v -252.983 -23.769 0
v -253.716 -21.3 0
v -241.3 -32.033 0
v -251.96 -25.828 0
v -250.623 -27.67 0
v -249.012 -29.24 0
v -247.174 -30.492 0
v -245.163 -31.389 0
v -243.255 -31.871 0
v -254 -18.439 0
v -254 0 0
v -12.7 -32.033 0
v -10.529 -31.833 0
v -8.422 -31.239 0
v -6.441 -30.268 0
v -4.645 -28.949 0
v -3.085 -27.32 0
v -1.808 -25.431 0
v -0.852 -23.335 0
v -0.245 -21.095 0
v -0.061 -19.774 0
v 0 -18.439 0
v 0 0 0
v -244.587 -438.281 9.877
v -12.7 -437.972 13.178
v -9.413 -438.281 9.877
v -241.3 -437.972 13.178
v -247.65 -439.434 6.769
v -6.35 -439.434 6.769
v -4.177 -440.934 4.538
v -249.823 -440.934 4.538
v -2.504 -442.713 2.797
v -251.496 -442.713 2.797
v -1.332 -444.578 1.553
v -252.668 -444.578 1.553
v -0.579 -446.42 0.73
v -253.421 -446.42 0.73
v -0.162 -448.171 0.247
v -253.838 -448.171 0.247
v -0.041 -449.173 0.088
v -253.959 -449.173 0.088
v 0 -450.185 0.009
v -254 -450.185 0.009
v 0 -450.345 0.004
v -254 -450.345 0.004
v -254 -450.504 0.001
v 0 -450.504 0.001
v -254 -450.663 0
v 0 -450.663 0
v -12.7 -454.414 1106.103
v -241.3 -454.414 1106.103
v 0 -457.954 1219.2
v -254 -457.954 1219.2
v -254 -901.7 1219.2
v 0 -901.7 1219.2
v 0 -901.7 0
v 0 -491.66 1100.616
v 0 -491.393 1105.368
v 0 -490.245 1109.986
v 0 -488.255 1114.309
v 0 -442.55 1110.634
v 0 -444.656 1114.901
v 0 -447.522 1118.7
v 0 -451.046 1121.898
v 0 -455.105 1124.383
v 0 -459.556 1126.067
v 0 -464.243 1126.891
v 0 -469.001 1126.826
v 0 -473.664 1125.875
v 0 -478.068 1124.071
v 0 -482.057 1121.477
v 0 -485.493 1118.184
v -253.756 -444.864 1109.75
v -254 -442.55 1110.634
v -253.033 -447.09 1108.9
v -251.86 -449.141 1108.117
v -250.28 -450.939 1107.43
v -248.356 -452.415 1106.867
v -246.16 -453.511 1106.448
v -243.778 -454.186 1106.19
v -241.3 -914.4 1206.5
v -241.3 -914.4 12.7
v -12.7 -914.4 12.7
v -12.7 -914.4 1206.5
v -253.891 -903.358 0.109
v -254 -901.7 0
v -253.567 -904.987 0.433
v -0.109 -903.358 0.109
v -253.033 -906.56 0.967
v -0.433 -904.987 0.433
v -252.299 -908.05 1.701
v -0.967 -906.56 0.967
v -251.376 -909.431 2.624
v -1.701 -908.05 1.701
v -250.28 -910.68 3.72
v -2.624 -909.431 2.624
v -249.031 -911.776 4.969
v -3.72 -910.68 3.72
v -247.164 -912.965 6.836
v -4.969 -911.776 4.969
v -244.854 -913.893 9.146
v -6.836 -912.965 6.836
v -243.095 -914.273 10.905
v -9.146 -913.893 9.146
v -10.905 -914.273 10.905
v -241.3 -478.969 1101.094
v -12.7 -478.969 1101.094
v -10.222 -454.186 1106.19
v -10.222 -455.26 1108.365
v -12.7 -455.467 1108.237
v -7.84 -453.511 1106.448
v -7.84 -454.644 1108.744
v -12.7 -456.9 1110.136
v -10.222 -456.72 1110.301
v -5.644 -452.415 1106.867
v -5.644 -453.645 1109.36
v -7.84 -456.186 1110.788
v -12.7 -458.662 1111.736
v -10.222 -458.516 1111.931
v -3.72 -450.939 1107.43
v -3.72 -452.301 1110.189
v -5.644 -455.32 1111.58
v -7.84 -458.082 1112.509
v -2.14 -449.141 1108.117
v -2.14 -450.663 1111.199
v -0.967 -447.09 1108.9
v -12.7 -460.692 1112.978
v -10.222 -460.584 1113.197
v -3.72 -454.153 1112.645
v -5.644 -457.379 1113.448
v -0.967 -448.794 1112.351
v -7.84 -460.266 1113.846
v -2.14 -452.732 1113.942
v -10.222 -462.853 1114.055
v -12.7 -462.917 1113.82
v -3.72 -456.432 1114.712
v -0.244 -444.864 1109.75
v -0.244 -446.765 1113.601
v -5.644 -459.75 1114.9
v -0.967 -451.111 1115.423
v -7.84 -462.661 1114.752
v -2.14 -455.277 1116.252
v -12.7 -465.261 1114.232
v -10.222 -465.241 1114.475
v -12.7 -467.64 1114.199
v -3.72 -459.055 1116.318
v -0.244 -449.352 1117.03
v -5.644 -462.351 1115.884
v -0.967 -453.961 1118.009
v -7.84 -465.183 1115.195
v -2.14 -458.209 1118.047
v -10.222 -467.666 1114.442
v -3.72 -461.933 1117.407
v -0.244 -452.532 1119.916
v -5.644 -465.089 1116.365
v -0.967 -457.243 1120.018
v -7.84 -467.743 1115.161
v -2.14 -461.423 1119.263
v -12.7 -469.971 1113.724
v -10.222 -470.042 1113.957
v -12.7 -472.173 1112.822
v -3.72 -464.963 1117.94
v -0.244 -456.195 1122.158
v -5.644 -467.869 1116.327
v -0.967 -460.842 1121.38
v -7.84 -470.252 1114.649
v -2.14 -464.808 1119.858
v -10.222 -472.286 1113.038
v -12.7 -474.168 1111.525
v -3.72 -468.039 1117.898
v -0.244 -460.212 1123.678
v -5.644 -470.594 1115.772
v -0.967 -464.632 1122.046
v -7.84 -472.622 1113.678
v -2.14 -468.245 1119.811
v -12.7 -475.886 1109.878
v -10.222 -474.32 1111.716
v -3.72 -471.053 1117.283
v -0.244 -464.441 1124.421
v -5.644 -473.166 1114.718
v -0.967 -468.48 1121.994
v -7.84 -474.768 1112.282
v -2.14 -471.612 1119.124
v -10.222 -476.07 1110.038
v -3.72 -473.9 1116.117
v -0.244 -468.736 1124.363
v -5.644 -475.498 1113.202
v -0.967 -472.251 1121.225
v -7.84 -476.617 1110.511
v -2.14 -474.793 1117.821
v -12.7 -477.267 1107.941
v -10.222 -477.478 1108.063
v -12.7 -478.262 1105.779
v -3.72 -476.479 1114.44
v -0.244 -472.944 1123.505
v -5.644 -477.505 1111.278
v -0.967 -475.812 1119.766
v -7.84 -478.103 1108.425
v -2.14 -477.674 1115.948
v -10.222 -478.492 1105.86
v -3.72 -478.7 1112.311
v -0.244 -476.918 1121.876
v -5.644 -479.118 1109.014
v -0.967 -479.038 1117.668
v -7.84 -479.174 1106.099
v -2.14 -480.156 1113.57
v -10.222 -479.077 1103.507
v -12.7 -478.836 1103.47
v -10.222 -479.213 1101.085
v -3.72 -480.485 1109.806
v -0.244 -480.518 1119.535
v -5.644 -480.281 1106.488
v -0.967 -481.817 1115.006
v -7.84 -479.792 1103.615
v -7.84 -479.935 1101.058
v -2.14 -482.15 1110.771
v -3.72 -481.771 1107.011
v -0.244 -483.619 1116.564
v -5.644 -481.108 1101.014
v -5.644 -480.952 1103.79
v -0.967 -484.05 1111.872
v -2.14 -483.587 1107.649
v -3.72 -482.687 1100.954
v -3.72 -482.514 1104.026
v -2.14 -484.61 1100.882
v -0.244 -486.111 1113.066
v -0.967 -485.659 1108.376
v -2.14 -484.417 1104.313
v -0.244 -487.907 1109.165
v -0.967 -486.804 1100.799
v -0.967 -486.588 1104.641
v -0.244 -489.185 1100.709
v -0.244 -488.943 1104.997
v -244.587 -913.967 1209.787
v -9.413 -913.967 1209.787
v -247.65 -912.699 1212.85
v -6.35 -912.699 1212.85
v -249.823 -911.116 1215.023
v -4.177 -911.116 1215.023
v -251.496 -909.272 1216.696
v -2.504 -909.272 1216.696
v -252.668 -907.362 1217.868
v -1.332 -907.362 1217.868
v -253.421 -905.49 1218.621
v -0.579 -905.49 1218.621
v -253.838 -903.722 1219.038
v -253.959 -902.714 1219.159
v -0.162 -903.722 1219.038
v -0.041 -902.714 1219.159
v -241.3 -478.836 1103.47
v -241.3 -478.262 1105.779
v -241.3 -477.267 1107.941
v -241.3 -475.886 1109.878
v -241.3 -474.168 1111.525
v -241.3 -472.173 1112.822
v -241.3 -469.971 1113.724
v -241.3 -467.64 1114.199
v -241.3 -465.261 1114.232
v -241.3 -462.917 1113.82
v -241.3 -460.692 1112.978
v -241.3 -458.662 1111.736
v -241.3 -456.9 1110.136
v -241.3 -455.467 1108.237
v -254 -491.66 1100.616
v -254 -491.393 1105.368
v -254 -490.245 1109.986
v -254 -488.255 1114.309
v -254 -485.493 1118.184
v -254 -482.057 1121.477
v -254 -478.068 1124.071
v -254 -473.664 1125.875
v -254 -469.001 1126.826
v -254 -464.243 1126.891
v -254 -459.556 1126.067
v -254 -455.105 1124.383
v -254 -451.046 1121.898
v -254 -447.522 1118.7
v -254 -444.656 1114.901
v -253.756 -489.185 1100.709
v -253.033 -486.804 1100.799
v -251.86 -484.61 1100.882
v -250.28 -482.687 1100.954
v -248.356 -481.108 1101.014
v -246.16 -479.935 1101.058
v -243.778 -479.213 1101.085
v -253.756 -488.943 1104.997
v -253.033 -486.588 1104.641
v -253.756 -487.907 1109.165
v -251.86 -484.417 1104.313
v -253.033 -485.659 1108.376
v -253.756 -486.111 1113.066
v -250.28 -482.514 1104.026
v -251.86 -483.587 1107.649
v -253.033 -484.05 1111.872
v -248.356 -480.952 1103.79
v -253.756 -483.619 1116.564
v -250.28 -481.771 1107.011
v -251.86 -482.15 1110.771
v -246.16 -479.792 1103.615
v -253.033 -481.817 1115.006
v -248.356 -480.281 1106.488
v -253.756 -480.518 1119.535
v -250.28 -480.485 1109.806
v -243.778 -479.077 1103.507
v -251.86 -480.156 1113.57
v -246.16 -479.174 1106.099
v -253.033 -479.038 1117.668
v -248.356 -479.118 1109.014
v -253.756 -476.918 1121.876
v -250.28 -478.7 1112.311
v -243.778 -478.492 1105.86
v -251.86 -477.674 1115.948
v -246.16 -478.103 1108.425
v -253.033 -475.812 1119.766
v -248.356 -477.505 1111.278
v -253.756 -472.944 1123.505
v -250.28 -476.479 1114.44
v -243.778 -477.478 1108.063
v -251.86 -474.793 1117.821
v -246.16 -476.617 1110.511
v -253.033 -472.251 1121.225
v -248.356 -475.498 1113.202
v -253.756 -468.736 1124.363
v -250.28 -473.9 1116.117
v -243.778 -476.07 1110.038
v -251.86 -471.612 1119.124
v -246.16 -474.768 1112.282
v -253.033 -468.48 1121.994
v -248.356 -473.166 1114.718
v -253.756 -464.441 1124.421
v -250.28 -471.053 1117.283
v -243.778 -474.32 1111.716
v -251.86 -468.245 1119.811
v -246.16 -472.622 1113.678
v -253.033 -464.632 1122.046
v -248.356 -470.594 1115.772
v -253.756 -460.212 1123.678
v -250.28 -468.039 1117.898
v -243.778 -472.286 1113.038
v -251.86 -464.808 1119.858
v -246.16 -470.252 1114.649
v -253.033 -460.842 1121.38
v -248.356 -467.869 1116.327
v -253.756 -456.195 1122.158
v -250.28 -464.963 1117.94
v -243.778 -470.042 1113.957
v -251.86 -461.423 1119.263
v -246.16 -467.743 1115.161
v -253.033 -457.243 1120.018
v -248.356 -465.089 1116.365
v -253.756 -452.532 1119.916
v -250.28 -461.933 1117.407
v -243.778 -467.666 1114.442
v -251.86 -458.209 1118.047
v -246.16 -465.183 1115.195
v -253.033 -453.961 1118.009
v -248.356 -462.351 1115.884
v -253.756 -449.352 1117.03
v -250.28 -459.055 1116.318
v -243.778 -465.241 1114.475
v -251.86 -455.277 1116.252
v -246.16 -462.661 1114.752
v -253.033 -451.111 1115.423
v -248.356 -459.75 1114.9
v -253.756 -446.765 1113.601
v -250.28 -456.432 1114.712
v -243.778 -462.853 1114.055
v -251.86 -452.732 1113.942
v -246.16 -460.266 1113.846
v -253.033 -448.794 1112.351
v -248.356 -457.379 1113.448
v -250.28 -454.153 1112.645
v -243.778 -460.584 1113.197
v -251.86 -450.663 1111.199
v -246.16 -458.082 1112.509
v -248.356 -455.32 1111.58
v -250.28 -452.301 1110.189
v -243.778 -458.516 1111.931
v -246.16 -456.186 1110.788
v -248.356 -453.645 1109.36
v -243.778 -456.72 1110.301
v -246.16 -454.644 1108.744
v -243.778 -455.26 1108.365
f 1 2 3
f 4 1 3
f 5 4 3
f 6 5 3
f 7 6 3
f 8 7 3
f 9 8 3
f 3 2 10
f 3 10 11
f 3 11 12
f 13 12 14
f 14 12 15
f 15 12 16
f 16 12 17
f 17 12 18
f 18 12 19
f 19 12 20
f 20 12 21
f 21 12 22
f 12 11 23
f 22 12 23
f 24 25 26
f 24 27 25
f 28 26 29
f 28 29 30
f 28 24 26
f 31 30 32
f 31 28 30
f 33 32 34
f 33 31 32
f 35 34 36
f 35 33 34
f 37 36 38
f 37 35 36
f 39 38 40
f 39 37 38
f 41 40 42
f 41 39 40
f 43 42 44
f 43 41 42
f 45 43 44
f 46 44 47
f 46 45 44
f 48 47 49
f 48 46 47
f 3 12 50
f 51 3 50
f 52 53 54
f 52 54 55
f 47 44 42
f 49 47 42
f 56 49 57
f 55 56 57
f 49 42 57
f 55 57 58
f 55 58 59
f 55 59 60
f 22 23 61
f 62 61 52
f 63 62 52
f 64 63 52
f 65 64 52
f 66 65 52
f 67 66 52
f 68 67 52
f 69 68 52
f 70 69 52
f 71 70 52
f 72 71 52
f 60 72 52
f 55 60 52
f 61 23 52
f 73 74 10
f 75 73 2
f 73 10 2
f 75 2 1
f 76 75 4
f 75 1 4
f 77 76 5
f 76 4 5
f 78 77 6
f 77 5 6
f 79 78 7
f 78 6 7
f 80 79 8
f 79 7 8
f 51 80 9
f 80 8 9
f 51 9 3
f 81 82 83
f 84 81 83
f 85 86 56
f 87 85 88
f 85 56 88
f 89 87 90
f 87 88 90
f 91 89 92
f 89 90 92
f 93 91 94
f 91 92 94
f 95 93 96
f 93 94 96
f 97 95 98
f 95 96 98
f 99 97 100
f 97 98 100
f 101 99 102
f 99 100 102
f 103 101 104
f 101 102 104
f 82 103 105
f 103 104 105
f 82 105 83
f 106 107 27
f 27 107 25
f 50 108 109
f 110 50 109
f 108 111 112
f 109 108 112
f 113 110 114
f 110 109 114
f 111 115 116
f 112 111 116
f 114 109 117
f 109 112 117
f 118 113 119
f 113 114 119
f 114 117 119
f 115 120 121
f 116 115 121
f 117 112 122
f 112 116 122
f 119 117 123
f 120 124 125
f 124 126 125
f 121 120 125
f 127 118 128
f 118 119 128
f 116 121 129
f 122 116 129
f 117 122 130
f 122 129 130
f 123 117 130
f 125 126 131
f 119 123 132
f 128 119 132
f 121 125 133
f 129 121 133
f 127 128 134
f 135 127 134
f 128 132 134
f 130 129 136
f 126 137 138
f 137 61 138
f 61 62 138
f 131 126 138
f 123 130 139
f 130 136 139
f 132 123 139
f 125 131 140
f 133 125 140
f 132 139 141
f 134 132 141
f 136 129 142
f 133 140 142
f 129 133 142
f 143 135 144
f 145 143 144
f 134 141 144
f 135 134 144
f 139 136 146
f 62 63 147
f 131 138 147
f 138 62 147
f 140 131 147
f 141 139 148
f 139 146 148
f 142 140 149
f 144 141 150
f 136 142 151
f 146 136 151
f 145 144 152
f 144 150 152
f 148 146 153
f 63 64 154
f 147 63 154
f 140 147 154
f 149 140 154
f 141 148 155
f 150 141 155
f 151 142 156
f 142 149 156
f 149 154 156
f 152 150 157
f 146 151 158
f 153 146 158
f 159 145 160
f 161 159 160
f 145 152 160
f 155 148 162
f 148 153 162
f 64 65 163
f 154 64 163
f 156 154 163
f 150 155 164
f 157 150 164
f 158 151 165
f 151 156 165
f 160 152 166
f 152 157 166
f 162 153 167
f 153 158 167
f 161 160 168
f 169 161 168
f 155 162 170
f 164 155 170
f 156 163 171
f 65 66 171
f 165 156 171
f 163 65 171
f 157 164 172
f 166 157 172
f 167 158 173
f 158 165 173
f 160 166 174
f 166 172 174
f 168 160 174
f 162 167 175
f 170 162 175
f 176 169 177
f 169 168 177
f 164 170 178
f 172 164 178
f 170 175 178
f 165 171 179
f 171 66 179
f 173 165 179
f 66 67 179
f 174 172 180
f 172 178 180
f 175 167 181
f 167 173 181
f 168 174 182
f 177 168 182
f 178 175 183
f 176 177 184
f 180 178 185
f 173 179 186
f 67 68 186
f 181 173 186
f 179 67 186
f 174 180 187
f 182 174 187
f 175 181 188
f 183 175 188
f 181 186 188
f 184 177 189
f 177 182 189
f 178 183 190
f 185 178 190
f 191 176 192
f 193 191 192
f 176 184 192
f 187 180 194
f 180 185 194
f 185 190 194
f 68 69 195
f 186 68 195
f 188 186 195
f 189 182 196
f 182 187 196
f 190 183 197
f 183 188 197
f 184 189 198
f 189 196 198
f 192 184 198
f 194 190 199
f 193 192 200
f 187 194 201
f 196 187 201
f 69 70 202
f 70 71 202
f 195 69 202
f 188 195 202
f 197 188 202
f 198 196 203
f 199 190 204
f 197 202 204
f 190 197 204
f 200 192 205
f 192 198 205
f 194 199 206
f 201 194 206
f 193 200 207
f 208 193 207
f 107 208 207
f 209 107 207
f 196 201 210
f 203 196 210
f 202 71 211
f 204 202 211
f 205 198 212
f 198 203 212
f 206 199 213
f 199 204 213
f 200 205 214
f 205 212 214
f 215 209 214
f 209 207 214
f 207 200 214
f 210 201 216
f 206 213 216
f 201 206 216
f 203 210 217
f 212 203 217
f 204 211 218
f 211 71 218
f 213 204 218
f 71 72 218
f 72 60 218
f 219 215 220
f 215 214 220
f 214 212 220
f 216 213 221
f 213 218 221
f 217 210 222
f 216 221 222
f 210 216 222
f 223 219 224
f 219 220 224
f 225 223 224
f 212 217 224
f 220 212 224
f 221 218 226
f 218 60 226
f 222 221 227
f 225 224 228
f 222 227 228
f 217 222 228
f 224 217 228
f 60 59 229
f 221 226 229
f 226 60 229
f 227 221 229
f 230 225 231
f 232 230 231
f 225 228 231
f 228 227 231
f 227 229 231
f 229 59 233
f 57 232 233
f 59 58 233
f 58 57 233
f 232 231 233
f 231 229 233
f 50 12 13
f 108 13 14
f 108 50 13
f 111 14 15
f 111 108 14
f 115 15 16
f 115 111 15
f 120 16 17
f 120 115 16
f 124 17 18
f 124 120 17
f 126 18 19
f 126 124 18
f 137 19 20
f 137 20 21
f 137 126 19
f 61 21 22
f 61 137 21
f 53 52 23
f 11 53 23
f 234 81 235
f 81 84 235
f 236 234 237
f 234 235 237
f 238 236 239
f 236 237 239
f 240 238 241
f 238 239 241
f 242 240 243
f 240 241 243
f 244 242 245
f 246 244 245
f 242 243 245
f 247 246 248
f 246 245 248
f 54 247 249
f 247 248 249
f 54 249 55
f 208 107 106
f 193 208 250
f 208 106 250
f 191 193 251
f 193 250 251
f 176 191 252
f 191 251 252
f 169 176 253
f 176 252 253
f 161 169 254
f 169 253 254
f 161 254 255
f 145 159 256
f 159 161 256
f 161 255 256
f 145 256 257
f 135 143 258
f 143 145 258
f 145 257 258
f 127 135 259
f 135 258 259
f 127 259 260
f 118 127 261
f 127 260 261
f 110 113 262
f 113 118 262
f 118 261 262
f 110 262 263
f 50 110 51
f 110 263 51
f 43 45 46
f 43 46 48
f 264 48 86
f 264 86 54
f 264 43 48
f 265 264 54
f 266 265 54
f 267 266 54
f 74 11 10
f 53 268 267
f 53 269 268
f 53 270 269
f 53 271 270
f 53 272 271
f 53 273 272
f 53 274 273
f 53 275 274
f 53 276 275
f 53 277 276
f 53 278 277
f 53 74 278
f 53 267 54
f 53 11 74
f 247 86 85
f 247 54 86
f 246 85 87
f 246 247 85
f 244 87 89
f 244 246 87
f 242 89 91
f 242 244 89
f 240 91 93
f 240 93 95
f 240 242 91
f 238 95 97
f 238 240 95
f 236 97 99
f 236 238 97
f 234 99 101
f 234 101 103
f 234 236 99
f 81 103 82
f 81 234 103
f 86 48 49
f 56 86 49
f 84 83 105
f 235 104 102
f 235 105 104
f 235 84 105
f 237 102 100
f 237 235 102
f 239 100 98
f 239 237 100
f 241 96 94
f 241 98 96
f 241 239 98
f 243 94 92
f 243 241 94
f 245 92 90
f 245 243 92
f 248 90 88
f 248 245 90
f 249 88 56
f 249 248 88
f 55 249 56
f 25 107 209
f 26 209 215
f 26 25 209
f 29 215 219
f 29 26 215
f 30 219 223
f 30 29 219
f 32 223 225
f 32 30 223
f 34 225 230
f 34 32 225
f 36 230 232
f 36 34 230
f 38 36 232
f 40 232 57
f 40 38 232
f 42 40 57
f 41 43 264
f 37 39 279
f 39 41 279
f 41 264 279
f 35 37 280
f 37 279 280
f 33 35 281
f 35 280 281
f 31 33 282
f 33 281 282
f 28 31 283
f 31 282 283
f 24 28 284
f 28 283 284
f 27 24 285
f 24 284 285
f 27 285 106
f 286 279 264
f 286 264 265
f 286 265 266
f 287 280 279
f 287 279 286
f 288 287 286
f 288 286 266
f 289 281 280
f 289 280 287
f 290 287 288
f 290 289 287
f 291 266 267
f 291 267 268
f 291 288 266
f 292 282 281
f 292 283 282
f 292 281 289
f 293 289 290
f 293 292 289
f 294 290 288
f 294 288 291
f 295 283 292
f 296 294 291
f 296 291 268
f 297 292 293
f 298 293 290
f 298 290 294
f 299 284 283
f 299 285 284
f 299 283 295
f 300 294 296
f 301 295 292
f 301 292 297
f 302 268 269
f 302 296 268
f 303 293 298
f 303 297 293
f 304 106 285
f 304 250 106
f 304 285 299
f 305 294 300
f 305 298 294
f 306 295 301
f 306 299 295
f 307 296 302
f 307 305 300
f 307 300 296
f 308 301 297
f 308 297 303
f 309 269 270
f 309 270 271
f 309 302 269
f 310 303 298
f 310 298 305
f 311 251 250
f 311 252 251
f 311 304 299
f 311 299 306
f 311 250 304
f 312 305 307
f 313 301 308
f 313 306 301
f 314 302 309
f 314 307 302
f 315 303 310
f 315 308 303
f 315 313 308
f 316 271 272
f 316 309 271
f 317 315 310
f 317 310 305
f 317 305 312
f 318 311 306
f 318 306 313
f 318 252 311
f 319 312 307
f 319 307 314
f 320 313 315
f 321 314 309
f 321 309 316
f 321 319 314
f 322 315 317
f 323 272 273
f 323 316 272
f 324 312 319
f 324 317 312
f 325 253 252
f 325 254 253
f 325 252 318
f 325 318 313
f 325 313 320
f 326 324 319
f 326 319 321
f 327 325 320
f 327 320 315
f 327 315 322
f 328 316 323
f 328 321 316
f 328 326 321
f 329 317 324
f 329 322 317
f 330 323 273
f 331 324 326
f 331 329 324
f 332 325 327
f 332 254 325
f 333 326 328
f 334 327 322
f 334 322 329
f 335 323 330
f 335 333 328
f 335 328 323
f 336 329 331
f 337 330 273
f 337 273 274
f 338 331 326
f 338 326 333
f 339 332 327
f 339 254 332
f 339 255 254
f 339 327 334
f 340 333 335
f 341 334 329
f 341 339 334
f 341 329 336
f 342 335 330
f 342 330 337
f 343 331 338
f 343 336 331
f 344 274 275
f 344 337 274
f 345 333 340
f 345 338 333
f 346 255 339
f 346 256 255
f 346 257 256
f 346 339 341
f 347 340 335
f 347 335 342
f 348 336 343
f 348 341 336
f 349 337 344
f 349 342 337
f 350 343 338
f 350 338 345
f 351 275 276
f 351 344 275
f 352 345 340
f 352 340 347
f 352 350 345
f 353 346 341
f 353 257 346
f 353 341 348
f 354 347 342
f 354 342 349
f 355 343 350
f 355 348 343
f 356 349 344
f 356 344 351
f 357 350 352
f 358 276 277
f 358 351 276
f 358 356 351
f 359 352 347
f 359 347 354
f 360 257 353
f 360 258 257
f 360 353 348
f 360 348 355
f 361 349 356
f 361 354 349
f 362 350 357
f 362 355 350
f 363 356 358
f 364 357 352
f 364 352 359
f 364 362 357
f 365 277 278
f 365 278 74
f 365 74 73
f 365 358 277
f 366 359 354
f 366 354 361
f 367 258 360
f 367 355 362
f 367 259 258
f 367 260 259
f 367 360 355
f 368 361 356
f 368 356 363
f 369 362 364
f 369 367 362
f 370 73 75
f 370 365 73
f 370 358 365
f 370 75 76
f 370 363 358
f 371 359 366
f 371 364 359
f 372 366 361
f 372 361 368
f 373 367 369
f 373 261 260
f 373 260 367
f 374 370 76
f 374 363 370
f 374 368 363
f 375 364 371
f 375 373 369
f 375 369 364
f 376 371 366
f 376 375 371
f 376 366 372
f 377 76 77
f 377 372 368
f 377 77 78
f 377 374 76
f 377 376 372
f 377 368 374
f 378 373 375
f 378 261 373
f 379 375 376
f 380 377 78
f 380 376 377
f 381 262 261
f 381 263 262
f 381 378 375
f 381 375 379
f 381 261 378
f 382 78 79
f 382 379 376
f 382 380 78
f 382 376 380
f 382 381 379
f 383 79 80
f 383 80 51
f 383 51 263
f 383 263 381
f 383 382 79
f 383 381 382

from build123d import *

# Parameters (mm, degrees)
F0_W     = 254
F0_H     = 1219.2
F1_DEPTH = 914.4
F3_DEPTH = 254.001
F5_DEPTH = 254.001
F6_F1_R  = 12.7
F6_F2_R  = 12.7


with BuildPart() as f1:
    # F0 (on Front) → F1 (new body)
    with BuildSketch(Plane.XZ):
        with Locations((-127, 609.6)):
            Rectangle(F0_W, F0_H)
    extrude(amount=F1_DEPTH)

    # F2 (on Right) → F3 (cut, through all)
    with BuildSketch(Plane.YZ):
        Polygon((-462.4002873898, 1231.0378551483), (0, 0), (0, 1231.0378551483), align=None)
    extrude(amount=-F3_DEPTH, mode=Mode.SUBTRACT)

    # F4 (on Right) → F5 (cut, through all)
    with BuildSketch(Plane.YZ):
        Polygon((-437.4758601189, 0), (-32.0333614945, 0), (-481.8673729897, 1177.9962778091), align=None)
    extrude(amount=-F5_DEPTH, mode=Mode.SUBTRACT)

    # F6: fillet of radius 12.7 on 8 edges, made by hand

    # F6_f1
    f6_f1_edges = [f1.edges().sort_by_distance(p)[0] for p in [
        (-127, -481.8673729897, 1177.9962778091),
    ]]
    fillet(f6_f1_edges, radius=F6_F1_R)

    # F6_f2
    f6_f2_edges = [f1.edges().sort_by_distance(p)[0] for p in [
        (-127, -914.4, 0),
        (0, -914.4, 609.6),
        (-127, -914.4, 1219.2),
        (-254, -914.4, 609.6),
        (0, -458.2226343973, 550.5471946336),
        (-127, -437.4758601189, 0),
        (-254, -458.2226343973, 550.5471946336),
        (-254, -468.8167042617, 1114.0163928436),
        (0, -468.8167042617, 1114.0163928436),
    ]]
    fillet(f6_f2_edges, radius=F6_F2_R)


solid = f1.part
